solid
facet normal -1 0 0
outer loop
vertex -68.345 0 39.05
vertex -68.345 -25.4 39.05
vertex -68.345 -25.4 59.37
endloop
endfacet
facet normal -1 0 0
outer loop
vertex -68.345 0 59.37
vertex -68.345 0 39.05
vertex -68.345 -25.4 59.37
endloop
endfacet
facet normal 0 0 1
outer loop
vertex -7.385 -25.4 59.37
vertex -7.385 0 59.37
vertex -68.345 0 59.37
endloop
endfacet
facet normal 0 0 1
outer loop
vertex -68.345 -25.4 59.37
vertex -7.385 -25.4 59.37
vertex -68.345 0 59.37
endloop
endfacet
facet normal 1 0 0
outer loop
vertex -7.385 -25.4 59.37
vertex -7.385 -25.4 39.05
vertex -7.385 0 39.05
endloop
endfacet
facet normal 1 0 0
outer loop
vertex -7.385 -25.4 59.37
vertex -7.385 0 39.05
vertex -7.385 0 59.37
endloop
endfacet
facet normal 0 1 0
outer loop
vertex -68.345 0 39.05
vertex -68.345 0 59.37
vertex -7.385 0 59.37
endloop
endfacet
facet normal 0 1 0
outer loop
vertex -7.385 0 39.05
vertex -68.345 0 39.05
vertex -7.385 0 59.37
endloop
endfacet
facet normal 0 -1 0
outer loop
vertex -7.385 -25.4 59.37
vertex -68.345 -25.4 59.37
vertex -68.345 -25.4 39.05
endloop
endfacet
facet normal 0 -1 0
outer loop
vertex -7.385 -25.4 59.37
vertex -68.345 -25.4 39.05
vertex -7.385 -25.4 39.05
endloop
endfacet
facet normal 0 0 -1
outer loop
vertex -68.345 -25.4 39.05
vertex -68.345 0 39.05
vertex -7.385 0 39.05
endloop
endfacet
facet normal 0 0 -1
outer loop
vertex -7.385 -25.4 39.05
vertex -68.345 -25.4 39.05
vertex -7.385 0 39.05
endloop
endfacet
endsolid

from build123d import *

# Parameters (mm, degrees)
F0_W      = 20.32
F0_H      = 20.32
F0_H_2    = 20.1290453446
F1_DEPTH  = 25.4
F3_W      = 20.32
F3_H      = 20.32
F4_DEPTH  = 25.4
F5_R      = 7.62
F6_DEPTH  = 25.4
F7_R      = 6.35
F8_DEPTH  = 25.4
F9_R      = 6.35
F10_DEPTH = 25.4
F11_R     = 6.35
F12_DEPTH = 25.4


with BuildPart() as f1:
    # F0 (on Front) → F1 (new body)
    with BuildSketch(Plane.XZ):
        with Locations((-50.8, 47.9523509699)):
            Rectangle(F0_W, F0_H)
        with Locations((-30.48, 47.9523509699)):
            Rectangle(F0_W, F0_H)
        with Locations((-50.8, 27.6323509699)):
            Rectangle(F0_W, F0_H)
        Polygon((-20.32, 37.7923509699), (-40.64, 37.7923509699), (-40.64, 17.4723509699), (-20.32, 17.4723509699), (-20.32, 17.6633056253), align=None)
        with Locations((-10.16, 47.9523509699)):
            Rectangle(F0_W, F0_H)
        with Locations((-10.16, 27.7278282976)):
            Rectangle(F0_W, F0_H_2)
    extrude(amount=F1_DEPTH)


with BuildPart() as f4:
    # F3 (on Front) → F4 (new body)
    with BuildSketch(Plane.XZ):
        with Locations((-58.185097698, 49.2102251685)):
            Rectangle(F3_W, F3_H)
        with Locations((-37.865097698, 49.2102251685)):
            Rectangle(F3_W, F3_H)
        with Locations((-17.545097698, 49.2102251685)):
            Rectangle(F3_W, F3_H)
    extrude(amount=F4_DEPTH)

    # F5 (on Front) → F6 (cut)
    with BuildSketch(Plane.XZ):
        with Locations((-58.5276037455, 48.9798672497)):
            Circle(F5_R)
        with Locations((-38.4773612022, 48.9798672497)):
            Circle(F5_R)
        with Locations((-17.4723509699, 48.9798672497)):
            Circle(F5_R)
    extrude(amount=-F6_DEPTH, mode=Mode.SUBTRACT)

    # F7 (on Front) → F8 (cut)
    with BuildSketch(Plane.XZ):
        with Locations((-58.5276037455, 49.3617765605)):
            Circle(F7_R)
        with Locations((-40.5778624117, 49.3617765605)):
            Circle(F7_R)
        with Locations((-22.4371720105, 49.3617765605)):
            Circle(F7_R)
    extrude(amount=-F8_DEPTH, mode=Mode.SUBTRACT)

    # F9 (on Front) → F10 (cut)
    with BuildSketch(Plane.XZ):
        with Locations((-59.1004639864, 49.9346442521)):
            Circle(F9_R)
        with Locations((-41.1507301033, 49.9346442521)):
            Circle(F9_R)
        with Locations((-23.7738545984, 49.9346442521)):
            Circle(F9_R)
    extrude(amount=-F10_DEPTH, mode=Mode.SUBTRACT)

    # F11 (on Front) → F12 (cut)
    with BuildSketch(Plane.XZ):
        with Locations((-59.4823770225, 49.1708219051)):
            Circle(F11_R)
        with Locations((-41.9145487249, 49.1708219051)):
            Circle(F11_R)
        with Locations((-22.0552626997, 49.1708219051)):
            Circle(F11_R)
    extrude(amount=-F12_DEPTH, mode=Mode.SUBTRACT)


solid = f4.part
